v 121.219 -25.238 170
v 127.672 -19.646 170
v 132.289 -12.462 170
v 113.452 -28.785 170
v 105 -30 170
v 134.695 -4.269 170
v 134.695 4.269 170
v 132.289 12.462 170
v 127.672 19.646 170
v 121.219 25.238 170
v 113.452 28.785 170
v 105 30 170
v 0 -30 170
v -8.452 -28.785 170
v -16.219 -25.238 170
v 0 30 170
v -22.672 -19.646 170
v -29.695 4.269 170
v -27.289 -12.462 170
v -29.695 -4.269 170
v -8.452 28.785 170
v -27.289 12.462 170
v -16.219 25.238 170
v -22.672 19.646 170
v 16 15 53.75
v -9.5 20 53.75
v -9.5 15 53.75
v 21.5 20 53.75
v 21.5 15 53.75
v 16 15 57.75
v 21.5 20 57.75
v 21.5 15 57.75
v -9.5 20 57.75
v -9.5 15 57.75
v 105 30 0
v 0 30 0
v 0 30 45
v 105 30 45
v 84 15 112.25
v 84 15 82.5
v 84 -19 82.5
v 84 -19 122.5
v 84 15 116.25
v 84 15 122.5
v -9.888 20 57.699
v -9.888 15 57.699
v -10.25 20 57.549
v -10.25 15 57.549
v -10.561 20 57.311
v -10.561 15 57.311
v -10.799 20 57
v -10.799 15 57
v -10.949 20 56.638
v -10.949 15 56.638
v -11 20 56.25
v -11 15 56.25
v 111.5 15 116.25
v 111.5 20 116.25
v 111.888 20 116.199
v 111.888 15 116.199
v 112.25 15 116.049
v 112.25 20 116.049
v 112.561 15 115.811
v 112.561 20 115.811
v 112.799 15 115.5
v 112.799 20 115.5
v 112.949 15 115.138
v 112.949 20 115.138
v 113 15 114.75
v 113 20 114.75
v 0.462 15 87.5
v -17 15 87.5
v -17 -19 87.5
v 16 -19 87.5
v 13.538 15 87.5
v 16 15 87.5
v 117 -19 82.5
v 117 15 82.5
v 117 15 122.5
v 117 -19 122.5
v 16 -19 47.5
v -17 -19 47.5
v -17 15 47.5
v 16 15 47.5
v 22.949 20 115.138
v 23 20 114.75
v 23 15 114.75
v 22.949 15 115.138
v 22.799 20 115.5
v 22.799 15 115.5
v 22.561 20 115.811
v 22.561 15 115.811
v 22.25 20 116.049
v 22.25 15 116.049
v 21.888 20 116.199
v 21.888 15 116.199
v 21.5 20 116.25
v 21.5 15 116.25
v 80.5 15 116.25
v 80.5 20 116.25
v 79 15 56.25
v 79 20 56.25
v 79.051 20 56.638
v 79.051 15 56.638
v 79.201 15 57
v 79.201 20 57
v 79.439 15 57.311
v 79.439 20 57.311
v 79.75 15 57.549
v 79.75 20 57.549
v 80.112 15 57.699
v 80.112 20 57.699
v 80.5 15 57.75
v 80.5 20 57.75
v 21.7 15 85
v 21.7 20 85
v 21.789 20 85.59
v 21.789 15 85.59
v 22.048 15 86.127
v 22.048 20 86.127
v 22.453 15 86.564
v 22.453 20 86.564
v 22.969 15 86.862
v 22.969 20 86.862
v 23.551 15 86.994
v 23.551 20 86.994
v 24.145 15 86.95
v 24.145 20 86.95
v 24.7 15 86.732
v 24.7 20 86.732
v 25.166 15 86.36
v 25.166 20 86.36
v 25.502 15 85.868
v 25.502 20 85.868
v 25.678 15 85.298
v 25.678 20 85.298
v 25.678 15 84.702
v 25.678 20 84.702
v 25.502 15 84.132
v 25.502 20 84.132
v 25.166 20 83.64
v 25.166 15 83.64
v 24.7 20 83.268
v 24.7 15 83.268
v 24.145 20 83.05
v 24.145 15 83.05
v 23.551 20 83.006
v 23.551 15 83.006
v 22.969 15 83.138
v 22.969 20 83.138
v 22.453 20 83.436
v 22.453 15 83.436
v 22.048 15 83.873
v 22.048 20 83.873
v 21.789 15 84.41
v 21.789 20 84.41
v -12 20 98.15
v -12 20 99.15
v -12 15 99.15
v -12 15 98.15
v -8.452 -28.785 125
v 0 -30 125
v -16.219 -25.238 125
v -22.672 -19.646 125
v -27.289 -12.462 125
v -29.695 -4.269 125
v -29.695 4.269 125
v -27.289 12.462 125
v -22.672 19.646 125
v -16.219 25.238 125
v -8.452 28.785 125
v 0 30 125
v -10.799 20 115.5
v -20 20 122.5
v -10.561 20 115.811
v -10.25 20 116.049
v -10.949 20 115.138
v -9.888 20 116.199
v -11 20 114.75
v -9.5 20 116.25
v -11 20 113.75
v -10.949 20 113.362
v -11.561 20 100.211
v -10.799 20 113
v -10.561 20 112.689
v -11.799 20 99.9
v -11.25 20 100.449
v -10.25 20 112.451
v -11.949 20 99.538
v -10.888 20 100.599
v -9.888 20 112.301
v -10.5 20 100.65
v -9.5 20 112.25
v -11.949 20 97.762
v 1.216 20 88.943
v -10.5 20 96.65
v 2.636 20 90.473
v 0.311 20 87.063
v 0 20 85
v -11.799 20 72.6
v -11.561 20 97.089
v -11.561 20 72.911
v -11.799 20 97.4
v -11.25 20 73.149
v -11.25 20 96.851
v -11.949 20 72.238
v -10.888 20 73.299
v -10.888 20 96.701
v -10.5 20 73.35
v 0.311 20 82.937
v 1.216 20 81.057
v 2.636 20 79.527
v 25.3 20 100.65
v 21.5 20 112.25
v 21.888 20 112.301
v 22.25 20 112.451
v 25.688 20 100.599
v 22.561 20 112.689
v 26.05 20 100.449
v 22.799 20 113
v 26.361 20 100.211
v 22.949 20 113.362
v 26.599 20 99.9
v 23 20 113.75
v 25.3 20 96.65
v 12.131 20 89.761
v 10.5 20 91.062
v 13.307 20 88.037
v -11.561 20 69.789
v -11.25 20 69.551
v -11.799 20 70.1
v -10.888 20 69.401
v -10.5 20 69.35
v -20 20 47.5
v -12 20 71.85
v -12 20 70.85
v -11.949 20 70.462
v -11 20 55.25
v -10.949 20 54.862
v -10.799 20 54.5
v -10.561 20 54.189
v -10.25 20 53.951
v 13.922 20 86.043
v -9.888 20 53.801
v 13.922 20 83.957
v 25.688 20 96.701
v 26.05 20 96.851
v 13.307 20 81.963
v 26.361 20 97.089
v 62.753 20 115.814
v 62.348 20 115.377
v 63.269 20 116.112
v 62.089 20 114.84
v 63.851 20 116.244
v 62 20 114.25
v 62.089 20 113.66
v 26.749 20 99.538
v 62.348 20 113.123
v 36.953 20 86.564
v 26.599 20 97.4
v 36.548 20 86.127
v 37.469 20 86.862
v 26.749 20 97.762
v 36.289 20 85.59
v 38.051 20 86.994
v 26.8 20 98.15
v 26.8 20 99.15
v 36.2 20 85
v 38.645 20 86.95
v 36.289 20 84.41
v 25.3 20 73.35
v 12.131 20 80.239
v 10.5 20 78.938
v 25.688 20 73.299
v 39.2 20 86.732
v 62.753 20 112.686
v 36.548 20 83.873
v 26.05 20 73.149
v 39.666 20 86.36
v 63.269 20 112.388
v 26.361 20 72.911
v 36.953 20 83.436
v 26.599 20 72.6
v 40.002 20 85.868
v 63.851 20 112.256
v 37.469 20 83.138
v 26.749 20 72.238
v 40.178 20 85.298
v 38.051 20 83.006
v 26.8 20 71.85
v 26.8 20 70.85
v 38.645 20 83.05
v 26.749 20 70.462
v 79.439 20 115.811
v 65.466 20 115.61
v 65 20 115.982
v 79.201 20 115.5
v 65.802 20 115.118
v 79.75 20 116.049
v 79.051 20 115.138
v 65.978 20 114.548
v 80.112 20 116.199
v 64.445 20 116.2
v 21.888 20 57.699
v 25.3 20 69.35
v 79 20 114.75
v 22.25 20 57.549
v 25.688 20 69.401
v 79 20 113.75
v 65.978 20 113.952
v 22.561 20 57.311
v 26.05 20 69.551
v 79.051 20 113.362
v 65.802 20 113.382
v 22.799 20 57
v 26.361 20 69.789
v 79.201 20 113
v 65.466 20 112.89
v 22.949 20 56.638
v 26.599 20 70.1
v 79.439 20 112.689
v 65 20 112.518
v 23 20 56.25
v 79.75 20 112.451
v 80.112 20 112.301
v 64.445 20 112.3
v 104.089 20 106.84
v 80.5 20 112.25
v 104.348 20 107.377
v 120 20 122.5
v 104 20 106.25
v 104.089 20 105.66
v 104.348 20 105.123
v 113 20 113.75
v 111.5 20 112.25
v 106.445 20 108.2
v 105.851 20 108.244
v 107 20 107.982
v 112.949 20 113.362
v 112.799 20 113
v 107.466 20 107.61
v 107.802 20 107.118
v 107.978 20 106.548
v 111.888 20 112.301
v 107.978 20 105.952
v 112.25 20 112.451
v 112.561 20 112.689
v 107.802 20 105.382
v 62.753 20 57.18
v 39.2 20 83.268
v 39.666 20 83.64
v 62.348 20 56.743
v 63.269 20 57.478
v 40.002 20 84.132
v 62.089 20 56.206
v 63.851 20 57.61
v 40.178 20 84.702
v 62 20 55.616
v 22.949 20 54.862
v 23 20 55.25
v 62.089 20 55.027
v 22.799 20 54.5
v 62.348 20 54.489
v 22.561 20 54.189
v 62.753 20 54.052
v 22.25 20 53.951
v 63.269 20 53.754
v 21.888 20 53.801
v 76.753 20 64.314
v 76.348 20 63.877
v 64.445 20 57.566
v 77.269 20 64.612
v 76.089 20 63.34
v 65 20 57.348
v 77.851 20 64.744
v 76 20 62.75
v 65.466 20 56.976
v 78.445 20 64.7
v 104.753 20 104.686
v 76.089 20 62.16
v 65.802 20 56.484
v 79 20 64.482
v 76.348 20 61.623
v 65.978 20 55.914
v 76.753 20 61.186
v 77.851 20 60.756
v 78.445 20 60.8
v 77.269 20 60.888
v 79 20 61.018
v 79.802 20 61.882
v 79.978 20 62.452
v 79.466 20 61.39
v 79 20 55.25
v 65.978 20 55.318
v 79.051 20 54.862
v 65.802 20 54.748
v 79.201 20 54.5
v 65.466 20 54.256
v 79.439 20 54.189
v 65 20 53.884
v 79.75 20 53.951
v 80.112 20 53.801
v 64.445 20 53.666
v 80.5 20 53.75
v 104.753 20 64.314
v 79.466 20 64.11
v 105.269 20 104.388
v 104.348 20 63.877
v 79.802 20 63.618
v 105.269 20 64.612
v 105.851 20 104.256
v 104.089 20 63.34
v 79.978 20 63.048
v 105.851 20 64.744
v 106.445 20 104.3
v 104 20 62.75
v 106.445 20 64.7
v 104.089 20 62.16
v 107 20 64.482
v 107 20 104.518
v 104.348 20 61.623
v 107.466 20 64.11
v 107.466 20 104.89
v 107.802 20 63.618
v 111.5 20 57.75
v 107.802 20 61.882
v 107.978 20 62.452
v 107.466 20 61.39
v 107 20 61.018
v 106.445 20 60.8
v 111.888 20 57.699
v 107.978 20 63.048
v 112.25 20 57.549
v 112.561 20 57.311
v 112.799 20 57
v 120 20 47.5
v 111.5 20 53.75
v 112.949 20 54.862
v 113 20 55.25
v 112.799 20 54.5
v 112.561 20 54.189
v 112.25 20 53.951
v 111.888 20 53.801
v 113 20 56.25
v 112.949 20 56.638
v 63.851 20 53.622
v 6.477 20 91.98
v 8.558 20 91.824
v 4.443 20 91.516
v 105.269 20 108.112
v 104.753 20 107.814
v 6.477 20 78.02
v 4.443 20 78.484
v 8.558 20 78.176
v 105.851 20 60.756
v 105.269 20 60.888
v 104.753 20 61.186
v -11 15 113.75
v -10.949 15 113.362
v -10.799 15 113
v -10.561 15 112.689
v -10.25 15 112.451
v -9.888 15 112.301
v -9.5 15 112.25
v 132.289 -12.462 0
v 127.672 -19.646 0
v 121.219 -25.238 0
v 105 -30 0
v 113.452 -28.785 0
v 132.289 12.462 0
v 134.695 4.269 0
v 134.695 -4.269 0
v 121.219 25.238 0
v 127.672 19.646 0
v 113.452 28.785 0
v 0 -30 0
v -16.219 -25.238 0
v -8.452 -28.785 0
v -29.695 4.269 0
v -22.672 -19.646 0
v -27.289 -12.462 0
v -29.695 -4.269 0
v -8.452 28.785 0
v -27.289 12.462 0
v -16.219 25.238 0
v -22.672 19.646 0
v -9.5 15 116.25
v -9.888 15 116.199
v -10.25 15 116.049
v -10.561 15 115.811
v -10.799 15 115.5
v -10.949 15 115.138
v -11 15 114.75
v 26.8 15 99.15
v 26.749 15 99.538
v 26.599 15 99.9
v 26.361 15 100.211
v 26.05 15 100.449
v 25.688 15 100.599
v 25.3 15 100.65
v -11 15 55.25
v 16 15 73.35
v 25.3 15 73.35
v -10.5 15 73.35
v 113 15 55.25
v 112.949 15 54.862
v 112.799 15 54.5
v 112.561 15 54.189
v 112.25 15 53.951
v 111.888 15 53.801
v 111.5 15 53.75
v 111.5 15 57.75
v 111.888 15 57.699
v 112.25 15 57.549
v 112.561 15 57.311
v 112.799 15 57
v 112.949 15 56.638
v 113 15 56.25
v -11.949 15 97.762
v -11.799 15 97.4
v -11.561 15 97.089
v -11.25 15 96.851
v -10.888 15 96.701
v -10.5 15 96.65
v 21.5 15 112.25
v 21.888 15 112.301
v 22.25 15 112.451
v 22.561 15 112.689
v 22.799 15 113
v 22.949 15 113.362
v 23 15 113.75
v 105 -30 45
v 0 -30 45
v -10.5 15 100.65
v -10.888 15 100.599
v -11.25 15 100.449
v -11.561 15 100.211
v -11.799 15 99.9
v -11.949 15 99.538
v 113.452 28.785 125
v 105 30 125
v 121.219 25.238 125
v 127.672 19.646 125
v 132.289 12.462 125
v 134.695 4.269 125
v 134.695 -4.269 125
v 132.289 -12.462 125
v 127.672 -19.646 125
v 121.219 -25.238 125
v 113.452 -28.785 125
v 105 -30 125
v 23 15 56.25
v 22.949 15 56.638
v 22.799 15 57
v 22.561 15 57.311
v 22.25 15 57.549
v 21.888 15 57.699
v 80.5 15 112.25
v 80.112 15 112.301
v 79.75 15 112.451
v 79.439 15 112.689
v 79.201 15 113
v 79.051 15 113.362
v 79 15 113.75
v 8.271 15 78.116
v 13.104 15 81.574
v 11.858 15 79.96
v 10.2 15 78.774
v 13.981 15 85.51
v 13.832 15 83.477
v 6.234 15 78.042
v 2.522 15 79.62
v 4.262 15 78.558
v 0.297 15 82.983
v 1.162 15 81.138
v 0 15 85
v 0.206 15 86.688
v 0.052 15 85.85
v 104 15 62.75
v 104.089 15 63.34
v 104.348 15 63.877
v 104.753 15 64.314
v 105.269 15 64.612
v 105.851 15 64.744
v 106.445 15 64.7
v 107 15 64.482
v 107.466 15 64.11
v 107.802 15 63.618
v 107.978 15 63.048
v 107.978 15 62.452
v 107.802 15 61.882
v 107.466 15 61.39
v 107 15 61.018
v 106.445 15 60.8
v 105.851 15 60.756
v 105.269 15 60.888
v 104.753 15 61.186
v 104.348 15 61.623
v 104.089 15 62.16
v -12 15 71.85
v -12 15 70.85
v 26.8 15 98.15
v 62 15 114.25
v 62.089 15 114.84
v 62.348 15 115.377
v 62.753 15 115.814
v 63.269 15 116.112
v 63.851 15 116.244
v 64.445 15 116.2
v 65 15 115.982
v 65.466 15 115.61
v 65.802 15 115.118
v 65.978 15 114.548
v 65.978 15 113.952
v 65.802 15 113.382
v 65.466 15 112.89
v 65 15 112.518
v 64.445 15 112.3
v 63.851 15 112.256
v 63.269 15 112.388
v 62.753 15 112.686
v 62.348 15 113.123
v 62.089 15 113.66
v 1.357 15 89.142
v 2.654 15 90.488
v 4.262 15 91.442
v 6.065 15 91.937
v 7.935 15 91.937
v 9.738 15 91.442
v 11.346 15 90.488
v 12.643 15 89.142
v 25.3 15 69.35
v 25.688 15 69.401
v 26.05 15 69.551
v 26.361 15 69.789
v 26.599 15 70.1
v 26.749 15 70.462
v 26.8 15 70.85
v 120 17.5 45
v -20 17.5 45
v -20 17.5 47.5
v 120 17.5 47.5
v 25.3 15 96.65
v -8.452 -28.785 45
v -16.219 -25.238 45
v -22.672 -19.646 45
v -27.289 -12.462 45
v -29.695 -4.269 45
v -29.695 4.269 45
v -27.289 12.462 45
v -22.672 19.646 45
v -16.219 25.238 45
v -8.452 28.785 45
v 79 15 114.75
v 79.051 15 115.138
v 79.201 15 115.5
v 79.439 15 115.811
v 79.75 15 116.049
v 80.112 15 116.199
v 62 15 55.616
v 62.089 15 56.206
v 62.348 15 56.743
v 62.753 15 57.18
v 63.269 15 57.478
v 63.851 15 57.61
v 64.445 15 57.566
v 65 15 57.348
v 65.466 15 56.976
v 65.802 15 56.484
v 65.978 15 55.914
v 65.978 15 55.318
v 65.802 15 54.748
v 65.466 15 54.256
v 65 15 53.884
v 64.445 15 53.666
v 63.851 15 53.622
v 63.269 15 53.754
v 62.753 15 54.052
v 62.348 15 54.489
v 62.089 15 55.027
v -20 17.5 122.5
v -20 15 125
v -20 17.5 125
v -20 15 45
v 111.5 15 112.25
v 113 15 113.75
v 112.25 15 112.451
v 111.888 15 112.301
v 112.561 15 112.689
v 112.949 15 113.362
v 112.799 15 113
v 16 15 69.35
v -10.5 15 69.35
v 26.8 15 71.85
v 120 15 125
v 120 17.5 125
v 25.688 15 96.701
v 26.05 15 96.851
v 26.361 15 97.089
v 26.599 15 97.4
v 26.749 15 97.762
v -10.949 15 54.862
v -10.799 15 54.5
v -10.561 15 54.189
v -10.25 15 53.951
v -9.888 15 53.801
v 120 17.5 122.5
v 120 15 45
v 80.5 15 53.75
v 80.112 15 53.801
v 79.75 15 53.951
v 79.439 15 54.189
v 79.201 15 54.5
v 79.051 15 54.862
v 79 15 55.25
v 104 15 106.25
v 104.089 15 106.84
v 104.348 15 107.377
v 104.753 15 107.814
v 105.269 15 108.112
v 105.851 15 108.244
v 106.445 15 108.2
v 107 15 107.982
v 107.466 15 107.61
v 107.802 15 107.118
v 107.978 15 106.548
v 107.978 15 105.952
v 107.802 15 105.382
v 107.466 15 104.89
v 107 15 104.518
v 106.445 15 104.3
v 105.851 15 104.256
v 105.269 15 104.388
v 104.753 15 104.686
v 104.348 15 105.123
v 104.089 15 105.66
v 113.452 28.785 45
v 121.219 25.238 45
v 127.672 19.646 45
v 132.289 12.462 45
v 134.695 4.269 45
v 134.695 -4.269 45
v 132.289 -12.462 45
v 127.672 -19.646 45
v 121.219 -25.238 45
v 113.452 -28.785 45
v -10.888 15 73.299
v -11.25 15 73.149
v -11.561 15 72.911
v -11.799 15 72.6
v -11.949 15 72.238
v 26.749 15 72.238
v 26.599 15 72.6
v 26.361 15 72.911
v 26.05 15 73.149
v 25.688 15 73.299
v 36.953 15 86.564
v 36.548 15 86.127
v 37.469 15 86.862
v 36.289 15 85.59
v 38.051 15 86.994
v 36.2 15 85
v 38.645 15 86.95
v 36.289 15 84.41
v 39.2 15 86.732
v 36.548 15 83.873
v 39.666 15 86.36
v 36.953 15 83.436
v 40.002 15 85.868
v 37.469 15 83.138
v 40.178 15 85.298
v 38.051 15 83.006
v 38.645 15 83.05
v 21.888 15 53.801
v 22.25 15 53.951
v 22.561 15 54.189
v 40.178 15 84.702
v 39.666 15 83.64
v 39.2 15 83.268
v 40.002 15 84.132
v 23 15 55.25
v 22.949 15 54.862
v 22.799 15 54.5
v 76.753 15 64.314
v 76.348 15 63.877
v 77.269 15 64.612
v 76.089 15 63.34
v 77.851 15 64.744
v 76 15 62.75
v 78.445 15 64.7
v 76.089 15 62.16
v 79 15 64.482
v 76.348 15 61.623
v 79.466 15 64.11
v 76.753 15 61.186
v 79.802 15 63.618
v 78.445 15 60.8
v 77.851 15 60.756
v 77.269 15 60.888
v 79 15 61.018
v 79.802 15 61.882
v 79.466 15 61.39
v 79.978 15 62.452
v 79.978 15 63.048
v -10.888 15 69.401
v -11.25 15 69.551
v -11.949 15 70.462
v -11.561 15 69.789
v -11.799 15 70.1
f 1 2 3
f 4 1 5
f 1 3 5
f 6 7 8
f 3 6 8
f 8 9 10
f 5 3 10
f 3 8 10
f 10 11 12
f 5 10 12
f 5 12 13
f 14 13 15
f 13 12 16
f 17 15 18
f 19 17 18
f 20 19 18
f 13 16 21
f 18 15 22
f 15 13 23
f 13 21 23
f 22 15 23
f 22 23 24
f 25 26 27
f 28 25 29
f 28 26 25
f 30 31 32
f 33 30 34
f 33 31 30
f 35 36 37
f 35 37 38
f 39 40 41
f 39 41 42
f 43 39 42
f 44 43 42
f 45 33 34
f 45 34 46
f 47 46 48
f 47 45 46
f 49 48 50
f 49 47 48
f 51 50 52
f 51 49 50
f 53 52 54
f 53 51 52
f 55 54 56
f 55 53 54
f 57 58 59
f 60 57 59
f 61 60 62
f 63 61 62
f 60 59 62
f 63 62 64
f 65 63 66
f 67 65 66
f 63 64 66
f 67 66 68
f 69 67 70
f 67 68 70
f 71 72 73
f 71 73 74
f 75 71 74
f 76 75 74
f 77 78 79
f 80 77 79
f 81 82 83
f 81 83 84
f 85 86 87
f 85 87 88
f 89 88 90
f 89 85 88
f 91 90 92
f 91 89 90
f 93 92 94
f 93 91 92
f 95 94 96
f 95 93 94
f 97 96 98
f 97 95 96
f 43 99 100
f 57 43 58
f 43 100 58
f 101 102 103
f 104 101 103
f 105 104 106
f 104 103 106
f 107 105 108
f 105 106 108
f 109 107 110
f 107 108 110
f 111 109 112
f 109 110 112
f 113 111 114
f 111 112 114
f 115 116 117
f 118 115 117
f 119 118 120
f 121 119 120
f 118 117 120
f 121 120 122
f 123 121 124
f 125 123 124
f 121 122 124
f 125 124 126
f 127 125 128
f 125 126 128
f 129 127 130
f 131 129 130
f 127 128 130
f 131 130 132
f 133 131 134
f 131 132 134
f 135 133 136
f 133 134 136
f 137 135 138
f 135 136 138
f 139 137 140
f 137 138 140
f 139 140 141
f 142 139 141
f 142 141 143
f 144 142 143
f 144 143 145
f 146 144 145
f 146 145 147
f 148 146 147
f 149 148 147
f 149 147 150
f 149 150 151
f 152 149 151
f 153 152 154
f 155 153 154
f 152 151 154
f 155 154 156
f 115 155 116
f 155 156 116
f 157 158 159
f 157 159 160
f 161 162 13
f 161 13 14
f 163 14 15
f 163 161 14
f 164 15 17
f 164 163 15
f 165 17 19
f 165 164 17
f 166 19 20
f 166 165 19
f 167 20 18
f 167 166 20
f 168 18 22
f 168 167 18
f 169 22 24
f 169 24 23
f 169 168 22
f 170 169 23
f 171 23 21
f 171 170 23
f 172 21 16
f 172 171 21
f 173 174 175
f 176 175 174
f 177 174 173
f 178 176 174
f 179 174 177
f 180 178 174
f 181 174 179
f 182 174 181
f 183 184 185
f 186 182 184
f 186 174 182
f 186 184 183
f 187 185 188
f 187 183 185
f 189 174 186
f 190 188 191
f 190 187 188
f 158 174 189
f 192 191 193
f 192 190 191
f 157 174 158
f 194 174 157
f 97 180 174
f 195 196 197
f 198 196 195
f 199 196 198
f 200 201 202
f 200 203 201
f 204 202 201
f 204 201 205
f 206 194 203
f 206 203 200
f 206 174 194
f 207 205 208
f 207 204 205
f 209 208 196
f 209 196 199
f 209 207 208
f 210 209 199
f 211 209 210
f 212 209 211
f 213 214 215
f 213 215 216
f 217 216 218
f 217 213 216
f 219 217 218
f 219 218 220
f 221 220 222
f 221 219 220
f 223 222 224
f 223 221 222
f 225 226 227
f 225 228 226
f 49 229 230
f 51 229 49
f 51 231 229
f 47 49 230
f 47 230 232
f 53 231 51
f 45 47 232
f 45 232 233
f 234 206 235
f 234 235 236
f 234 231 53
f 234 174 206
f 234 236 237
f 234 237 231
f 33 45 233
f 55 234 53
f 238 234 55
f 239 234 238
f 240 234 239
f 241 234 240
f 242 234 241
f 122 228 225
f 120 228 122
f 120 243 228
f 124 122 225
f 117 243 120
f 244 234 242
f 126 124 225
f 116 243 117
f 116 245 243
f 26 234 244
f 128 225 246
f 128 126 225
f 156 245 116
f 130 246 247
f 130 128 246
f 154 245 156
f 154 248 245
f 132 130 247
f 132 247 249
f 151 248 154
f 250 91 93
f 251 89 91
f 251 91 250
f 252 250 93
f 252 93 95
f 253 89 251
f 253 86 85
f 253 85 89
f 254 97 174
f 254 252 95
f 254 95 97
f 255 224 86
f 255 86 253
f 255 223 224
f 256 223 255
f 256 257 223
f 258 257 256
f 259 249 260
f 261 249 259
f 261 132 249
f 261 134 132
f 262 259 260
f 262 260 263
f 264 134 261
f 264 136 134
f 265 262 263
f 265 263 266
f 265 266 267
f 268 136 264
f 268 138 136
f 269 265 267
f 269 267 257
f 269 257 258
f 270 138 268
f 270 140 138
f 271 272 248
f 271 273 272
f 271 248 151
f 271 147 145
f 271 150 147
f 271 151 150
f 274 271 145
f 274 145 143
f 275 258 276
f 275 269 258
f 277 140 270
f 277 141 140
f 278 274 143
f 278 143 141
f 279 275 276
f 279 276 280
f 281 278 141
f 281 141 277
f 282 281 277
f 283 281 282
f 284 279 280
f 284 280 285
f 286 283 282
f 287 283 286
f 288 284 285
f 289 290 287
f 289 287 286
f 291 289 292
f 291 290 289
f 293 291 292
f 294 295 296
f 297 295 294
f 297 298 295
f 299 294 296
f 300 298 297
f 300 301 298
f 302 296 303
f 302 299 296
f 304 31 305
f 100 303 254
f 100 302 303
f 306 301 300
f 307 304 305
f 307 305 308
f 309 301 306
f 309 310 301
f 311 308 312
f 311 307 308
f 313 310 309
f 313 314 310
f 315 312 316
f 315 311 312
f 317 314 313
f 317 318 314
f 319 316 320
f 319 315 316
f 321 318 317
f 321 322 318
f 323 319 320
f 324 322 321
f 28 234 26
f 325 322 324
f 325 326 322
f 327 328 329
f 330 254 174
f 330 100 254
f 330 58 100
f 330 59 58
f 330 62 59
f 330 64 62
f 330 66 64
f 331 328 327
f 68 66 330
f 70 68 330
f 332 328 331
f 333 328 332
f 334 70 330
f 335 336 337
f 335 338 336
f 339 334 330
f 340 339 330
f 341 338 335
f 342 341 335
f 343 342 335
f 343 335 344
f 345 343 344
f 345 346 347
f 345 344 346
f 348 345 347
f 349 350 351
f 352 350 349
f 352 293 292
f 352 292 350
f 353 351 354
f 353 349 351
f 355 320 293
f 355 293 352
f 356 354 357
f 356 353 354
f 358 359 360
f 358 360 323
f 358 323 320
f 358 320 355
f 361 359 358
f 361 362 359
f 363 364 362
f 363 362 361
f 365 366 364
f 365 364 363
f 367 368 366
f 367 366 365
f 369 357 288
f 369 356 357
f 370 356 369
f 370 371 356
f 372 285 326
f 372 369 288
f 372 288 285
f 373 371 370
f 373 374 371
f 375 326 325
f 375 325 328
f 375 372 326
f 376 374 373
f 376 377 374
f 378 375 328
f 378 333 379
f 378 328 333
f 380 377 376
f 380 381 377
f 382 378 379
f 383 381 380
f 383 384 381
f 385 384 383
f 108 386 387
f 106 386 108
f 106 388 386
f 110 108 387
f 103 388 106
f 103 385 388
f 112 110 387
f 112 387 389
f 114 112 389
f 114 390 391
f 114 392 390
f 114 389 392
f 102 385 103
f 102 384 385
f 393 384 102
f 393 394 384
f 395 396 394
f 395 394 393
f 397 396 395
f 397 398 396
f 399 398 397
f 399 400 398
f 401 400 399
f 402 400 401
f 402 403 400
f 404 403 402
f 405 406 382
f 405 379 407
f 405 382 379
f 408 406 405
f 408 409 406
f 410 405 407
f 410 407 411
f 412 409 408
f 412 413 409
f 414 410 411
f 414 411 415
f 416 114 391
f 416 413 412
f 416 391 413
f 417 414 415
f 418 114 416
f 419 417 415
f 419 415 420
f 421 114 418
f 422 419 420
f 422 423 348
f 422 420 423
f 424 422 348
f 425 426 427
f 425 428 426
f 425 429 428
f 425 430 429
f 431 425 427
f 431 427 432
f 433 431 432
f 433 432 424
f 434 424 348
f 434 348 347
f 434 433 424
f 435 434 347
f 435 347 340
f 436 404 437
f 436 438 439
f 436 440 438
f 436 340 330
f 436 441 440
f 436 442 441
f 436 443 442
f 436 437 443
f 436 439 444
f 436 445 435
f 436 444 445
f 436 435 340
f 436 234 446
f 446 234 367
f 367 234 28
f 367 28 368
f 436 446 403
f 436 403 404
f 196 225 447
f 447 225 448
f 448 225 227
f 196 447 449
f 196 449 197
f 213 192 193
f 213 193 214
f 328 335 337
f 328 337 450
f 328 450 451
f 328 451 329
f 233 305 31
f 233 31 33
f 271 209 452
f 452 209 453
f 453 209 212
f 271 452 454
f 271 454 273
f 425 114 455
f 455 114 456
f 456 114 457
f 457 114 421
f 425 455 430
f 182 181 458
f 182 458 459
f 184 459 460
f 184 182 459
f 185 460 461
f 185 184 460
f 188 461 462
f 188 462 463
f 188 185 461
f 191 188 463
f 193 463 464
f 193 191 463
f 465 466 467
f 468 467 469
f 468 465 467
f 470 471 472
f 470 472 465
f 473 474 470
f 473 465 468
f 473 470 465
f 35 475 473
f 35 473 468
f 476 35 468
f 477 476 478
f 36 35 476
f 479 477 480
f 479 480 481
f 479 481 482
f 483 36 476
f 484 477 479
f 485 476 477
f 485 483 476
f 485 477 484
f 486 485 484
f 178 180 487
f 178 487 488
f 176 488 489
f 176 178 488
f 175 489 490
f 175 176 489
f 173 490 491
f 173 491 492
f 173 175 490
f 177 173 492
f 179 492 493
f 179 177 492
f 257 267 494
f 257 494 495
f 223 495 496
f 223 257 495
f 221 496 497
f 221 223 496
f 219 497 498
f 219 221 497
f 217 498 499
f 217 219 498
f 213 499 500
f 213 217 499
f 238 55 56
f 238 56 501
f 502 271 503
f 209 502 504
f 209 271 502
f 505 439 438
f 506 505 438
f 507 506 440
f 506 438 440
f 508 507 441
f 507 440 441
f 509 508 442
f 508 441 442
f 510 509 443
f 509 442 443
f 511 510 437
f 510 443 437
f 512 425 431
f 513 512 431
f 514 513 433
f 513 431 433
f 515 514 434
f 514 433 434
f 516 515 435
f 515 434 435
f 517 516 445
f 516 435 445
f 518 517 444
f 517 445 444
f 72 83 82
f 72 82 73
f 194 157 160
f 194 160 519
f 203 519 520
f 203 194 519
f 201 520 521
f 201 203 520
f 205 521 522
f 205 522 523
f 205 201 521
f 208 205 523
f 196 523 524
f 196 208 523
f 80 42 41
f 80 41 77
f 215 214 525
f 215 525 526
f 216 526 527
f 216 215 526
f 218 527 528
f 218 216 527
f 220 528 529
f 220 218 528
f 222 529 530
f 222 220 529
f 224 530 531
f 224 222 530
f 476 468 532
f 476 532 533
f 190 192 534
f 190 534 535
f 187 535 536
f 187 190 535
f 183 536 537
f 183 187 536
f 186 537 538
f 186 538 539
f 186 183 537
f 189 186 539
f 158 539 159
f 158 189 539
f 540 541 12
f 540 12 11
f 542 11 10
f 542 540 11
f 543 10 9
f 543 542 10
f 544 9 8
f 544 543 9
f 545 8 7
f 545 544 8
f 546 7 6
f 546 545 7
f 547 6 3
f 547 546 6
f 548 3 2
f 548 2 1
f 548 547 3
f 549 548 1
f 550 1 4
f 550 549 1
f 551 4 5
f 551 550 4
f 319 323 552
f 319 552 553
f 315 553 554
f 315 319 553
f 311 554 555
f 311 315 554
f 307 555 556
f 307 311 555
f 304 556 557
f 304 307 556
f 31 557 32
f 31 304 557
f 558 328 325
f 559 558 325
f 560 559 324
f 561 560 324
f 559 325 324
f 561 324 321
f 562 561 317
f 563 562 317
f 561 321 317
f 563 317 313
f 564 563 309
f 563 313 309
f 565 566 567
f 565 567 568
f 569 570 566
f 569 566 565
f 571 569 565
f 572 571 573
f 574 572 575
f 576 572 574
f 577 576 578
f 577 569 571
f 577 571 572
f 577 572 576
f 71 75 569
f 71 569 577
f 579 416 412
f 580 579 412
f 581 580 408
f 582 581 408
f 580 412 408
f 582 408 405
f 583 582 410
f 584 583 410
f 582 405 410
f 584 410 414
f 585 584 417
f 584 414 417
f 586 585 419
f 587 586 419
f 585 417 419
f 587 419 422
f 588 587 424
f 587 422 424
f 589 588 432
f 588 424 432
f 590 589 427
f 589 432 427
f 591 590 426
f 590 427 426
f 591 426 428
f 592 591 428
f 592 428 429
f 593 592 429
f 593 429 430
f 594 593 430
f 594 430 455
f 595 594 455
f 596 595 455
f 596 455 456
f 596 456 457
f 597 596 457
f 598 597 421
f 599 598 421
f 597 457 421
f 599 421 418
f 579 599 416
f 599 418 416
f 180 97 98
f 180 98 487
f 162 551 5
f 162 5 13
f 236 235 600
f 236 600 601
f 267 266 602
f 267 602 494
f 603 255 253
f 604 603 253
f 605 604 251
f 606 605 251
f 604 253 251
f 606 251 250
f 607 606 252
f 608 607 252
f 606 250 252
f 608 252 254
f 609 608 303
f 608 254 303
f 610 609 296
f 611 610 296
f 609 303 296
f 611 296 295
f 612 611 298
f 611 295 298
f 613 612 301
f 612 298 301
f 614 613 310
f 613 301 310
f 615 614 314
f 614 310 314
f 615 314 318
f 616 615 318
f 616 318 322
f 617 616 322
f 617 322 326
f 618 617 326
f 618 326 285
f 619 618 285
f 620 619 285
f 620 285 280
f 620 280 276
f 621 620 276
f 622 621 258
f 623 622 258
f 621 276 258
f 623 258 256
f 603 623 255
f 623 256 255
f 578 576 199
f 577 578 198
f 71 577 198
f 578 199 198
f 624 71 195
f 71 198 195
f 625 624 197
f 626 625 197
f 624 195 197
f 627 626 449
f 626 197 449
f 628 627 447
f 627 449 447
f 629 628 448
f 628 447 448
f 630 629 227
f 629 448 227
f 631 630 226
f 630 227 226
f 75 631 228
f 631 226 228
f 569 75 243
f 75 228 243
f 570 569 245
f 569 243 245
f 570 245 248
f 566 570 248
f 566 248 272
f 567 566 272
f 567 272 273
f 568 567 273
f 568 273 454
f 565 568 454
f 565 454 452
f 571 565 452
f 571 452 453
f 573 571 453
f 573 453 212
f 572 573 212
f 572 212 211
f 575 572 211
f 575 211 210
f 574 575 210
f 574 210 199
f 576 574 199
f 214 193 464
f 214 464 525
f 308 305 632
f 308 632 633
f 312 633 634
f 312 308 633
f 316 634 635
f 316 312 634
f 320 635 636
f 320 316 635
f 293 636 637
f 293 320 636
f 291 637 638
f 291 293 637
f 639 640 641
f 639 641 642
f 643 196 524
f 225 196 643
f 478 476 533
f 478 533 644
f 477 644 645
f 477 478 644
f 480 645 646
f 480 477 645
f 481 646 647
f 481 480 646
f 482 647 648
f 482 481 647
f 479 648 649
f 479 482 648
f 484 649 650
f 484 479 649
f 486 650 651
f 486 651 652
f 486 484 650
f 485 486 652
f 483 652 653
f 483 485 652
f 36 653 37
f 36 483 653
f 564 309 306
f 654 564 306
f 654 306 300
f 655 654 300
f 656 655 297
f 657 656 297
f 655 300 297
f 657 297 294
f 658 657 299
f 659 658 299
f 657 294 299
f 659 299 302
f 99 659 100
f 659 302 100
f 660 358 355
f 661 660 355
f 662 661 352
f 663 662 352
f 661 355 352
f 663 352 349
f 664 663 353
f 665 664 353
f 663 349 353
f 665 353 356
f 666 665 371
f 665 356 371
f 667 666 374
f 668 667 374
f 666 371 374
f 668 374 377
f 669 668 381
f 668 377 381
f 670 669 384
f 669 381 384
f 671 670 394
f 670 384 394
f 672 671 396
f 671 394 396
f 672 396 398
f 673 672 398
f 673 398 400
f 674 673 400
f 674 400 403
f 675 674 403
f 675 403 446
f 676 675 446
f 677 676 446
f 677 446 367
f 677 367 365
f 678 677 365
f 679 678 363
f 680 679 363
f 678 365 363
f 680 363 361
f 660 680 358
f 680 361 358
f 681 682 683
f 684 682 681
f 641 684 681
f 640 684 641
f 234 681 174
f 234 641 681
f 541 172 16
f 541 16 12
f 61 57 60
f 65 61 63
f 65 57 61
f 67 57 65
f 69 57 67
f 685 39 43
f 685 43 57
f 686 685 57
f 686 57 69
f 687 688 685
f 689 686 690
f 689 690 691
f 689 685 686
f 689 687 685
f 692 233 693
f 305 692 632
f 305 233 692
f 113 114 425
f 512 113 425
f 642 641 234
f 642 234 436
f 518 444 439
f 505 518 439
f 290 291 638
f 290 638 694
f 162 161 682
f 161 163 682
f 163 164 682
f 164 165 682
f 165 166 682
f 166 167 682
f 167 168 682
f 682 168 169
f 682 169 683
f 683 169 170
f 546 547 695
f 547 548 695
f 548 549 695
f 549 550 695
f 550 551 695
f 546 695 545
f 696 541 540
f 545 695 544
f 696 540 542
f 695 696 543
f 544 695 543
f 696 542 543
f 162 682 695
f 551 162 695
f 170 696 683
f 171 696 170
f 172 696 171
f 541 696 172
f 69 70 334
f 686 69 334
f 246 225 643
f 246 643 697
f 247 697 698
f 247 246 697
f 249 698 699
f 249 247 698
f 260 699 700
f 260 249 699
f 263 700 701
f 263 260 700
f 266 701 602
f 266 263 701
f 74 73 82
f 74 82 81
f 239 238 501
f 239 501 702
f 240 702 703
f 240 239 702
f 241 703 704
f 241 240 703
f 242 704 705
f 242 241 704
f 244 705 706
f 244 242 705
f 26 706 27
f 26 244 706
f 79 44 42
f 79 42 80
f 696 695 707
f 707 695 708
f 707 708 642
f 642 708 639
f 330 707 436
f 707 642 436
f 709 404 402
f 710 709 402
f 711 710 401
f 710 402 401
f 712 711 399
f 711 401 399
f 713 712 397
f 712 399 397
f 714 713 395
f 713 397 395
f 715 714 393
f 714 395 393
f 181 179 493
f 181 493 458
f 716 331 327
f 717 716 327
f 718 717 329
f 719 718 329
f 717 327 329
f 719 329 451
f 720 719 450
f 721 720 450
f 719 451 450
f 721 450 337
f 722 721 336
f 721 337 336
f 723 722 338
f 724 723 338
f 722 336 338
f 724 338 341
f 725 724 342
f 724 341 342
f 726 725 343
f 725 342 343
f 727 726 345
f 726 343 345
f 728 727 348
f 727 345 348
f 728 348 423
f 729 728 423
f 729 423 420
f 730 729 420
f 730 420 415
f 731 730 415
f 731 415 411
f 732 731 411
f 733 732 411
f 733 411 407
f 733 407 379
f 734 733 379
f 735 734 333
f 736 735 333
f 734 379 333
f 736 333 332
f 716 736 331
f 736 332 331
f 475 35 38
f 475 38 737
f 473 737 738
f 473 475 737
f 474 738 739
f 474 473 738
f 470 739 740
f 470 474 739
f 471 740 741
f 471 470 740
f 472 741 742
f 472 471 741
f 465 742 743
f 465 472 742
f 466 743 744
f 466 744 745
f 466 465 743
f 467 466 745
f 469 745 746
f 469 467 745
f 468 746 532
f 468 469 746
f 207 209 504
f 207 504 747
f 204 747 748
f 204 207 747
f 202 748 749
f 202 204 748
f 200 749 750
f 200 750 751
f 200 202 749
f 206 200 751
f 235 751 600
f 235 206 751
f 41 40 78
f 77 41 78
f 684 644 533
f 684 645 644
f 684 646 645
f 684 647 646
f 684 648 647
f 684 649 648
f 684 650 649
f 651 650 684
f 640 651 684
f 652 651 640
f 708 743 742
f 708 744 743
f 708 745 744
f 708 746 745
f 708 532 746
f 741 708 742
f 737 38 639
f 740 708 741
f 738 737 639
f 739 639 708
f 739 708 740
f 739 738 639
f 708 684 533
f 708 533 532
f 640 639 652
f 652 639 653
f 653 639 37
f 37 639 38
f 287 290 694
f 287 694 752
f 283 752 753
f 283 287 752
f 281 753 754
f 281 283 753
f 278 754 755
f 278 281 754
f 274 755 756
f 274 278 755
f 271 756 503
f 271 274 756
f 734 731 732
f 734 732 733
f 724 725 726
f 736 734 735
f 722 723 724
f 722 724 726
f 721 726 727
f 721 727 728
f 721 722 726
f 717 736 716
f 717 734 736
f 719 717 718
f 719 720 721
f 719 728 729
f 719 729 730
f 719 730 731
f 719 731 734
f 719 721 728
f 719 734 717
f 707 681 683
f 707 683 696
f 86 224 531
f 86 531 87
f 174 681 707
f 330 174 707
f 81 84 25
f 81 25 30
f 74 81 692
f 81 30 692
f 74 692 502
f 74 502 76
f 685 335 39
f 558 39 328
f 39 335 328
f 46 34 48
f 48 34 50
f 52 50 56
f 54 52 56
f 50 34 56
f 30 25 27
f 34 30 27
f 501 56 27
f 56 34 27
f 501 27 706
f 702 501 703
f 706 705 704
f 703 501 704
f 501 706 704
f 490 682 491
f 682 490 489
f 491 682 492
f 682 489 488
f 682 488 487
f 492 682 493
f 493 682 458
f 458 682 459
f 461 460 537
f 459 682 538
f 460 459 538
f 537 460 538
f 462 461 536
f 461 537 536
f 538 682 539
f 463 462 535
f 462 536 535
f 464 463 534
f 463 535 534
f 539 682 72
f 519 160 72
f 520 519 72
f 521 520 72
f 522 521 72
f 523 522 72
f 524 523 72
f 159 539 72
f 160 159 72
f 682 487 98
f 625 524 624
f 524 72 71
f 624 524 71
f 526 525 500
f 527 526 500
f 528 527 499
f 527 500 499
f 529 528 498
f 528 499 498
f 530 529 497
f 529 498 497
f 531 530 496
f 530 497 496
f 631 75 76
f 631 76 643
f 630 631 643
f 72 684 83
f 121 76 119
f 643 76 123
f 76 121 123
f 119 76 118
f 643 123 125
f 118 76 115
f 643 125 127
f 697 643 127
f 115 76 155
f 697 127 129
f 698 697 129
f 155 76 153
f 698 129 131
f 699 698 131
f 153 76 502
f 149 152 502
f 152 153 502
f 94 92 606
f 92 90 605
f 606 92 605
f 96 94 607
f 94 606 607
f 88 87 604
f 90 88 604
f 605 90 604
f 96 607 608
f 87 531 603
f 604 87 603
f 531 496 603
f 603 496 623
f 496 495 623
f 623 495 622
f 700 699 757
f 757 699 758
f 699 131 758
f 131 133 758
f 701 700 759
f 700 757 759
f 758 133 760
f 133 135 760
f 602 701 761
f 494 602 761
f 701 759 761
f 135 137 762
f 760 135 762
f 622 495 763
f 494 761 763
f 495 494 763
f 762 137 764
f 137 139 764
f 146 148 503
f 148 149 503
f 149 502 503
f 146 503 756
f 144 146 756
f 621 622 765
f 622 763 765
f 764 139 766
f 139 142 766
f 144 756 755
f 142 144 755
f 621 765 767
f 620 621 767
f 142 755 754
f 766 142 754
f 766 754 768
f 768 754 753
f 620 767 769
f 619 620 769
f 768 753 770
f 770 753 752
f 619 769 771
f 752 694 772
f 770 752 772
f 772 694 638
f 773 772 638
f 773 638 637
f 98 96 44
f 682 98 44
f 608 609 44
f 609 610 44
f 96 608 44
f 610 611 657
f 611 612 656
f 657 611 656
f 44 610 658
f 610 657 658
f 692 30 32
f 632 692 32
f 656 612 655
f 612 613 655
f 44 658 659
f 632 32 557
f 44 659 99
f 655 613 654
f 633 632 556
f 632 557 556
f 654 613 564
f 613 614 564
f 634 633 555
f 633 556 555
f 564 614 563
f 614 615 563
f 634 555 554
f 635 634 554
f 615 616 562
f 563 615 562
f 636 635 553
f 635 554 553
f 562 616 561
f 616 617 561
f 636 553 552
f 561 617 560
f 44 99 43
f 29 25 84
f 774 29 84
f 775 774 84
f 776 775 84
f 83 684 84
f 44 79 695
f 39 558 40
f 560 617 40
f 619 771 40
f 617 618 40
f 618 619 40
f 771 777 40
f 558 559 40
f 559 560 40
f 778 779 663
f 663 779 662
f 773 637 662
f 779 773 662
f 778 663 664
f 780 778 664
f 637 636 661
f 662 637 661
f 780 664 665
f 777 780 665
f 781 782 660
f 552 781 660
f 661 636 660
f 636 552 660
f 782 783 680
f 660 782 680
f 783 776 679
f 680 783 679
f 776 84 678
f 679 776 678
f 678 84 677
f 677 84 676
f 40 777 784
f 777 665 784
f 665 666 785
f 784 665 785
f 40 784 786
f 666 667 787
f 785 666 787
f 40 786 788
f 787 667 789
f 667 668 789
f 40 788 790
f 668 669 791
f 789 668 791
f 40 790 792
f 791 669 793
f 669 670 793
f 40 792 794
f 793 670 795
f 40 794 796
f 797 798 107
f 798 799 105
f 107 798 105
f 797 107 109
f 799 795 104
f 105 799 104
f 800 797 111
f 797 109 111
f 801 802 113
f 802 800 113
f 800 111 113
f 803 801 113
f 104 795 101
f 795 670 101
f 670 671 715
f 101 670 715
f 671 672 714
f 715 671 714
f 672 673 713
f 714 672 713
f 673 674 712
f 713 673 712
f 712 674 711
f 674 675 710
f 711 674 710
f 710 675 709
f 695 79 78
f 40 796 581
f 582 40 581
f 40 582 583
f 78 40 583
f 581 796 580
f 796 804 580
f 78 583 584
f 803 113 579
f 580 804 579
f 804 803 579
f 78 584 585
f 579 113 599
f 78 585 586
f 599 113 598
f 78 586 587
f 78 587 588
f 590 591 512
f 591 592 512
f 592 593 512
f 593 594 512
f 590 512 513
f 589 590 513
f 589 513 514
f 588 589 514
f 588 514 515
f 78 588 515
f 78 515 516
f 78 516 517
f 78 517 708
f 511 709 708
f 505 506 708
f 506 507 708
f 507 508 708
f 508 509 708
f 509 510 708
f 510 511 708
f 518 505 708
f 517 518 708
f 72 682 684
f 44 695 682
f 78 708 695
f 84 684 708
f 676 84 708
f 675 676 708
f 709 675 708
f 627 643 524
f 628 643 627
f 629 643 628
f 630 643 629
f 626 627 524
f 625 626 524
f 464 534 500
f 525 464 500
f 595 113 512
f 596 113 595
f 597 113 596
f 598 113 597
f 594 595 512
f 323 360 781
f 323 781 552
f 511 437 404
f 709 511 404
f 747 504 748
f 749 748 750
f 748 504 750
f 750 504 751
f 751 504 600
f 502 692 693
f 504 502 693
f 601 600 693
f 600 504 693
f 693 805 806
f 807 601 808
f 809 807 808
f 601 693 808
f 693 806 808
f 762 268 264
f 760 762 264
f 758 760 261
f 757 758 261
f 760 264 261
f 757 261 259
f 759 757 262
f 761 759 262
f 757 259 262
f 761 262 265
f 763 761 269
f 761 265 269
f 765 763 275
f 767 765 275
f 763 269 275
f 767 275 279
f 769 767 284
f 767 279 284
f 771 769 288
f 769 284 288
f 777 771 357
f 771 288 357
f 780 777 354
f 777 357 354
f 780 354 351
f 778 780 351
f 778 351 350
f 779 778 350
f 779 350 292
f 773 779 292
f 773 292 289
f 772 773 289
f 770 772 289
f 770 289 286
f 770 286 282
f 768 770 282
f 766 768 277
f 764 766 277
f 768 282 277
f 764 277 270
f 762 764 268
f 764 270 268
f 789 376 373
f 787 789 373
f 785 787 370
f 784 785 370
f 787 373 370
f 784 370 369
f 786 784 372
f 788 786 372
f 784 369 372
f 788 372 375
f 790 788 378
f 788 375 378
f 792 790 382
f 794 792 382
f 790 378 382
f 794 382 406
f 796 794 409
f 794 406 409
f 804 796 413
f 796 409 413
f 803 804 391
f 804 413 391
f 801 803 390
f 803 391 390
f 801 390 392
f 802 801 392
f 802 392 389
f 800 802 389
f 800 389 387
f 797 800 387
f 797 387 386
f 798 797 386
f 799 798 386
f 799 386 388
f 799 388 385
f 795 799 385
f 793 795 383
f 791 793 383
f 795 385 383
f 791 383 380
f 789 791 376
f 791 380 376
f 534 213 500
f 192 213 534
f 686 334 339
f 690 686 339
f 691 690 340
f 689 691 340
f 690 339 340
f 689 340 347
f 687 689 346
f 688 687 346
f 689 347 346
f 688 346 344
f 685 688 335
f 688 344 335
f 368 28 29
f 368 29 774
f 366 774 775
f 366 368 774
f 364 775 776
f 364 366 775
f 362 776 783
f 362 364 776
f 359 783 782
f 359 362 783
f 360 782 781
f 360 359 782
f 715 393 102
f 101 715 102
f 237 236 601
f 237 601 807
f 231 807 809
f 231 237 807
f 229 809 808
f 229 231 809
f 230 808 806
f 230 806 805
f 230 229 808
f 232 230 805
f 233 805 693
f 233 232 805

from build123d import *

# Parameters (mm, degrees)
BOSS_EXTRU_1_DEPTH      = 170
ESQUISSE2_W             = 206.92447976
ESQUISSE2_H             = 80
ENL_V_MAT_EXTRU_1_DEPTH = 170
ESQUISSE3_W             = 140
ESQUISSE3_H             = 2.5
BOSS_EXTRU_2_DEPTH      = 80
ESQUISSE4_W             = 140
ESQUISSE4_H             = 75
BOSS_EXTRU_4_DEPTH      = 2.5
ESQUISSE5_W             = 33
ESQUISSE5_H             = 40
BOSS_EXTRU_5_DEPTH      = 34
ESQUISSE6_R             = 7
ESQUISSE6_R_2           = 2
ENL_V_MAT_EXTRU_2_DEPTH = 5


with BuildPart() as part:
    # Esquisse1 → Boss.-Extru.1 (new body)
    with BuildSketch(Plane.XY):
        with BuildLine():
            Line((0, 30), (105, 30))
            ThreePointArc((105, 30), (135, 0), (105, -30))
            Line((105, -30), (0, -30))
            ThreePointArc((0, -30), (-30, 0), (0, 30))
        make_face()
    extrude(amount=BOSS_EXTRU_1_DEPTH)

    # Esquisse2 → Enlèv. mat.-Extru.1 (cut)
    with BuildSketch(Plane(origin=(0, 30, 0), x_dir=(1, 0, 0), z_dir=(0, 1, 0))):
        with Locations((42.57058543, -85)):
            Rectangle(ESQUISSE2_W, ESQUISSE2_H)
    extrude(amount=-ENL_V_MAT_EXTRU_1_DEPTH, mode=Mode.SUBTRACT)


with BuildPart() as enl_v_mat_extru_1_piece_1:
    # of the separate pieces the step leaves, piece 1, a body of its own (enl_v_mat_extru_1_pieces)
    add(part.part.solids().sort_by_distance((105, -30, 0))[0])



with BuildPart() as enl_v_mat_extru_1_piece_2:
    # of the separate pieces the step leaves, piece 2, a body of its own (enl_v_mat_extru_1_pieces)
    add(part.part.solids().sort_by_distance((0, -30, 125))[0])


with BuildPart() as enl_v_mat_extru_1_piece_1_1:
    add(enl_v_mat_extru_1_piece_1.part)

    add(enl_v_mat_extru_1_piece_2.part)  # Boss.-Extru.2 merges Enlèv. mat.-Extru.1 piece 2
    # Esquisse3 → Boss.-Extru.2 (add)
    with BuildSketch(Plane.XY.offset(45)):
        with Locations((50, 16.25)):
            Rectangle(ESQUISSE3_W, ESQUISSE3_H)
    extrude(amount=BOSS_EXTRU_2_DEPTH)

    # Esquisse4 → Boss.-Extru.4 (add)
    with BuildSketch(Plane(origin=(0, 17.5, 0), x_dir=(1, 0, 0), z_dir=(0, 1, 0))):
        with Locations((50, -85)):
            Rectangle(ESQUISSE4_W, ESQUISSE4_H)
    extrude(amount=BOSS_EXTRU_4_DEPTH)

    # Esquisse5 → Boss.-Extru.5 (add)
    with BuildSketch(Plane.XZ.offset(-15)):
        with Locations((-0.5, 67.5)):
            Rectangle(ESQUISSE5_W, ESQUISSE5_H)
        with Locations((100.5, 102.5)):
            Rectangle(ESQUISSE5_W, ESQUISSE5_H)
    extrude(amount=BOSS_EXTRU_5_DEPTH)

    # Esquisse6 → Enlèv. mat.-Extru.2 (cut)
    with BuildSketch(Plane(origin=(0, 20, 0), x_dir=(1, 0, 0), z_dir=(0, 1, 0))):
        with Locations(Location((7, -85, 0), (0, 0, 180))):
            Circle(ESQUISSE6_R)
        with Locations(Location((23.7, -85, 0), (0, 0, 180))):
            Circle(ESQUISSE6_R_2)
        with Locations(Location((38.2, -85, 0), (0, 0, 180))):
            Circle(ESQUISSE6_R_2)
        with Locations(Location((64, -114.25, 0), (0, 0, 180))):
            Circle(ESQUISSE6_R_2)
        with Locations(Location((64, -55.616071429, 0), (0, 0, 180))):
            Circle(ESQUISSE6_R_2)
        with Locations(Location((78, -62.75, 0), (0, 0, 180))):
            Circle(ESQUISSE6_R_2)
        with Locations(Location((106, -62.75, 0), (0, 0, 180))):
            Circle(ESQUISSE6_R_2)
        with Locations(Location((106, -106.25, 0), (0, 0, 180))):
            Circle(ESQUISSE6_R_2)
        with BuildLine():
            Line((-9.5, -53.75), (21.5, -53.75))
            ThreePointArc((21.5, -53.75), (22.560660172, -54.189339828), (23, -55.25))
            Line((23, -55.25), (23, -56.25))
            ThreePointArc((23, -56.25), (22.560660172, -57.310660172), (21.5, -57.75))
            Line((21.5, -57.75), (-9.5, -57.75))
            ThreePointArc((-9.5, -57.75), (-10.560660172, -57.310660172), (-11, -56.25))
            Line((-11, -56.25), (-11, -55.25))
            ThreePointArc((-11, -55.25), (-10.560660172, -54.189339828), (-9.5, -53.75))
        make_face()
        with BuildLine():
            Line((-10.5, -69.35), (25.3, -69.35))
            ThreePointArc((25.3, -69.35), (26.360660172, -69.789339828), (26.8, -70.85))
            Line((26.8, -70.85), (26.8, -71.85))
            ThreePointArc((26.8, -71.85), (26.360660172, -72.910660172), (25.3, -73.35))
            Line((25.3, -73.35), (-10.5, -73.35))
            ThreePointArc((-10.5, -73.35), (-11.560660172, -72.910660172), (-12, -71.85))
            Line((-12, -71.85), (-12, -70.85))
            ThreePointArc((-12, -70.85), (-11.560660172, -69.789339828), (-10.5, -69.35))
        make_face()
        with BuildLine():
            Line((-10.5, -96.65), (25.3, -96.65))
            ThreePointArc((25.3, -96.65), (26.360660172, -97.089339828), (26.8, -98.15))
            Line((26.8, -98.15), (26.8, -99.15))
            ThreePointArc((26.8, -99.15), (26.360660172, -100.210660172), (25.3, -100.65))
            Line((25.3, -100.65), (-10.5, -100.65))
            ThreePointArc((-10.5, -100.65), (-11.560660172, -100.210660172), (-12, -99.15))
            Line((-12, -99.15), (-12, -98.15))
            ThreePointArc((-12, -98.15), (-11.560660172, -97.089339828), (-10.5, -96.65))
        make_face()
        with BuildLine():
            Line((-9.5, -112.25), (21.5, -112.25))
            ThreePointArc((21.5, -112.25), (22.560660172, -112.689339828), (23, -113.75))
            Line((23, -113.75), (23, -114.75))
            ThreePointArc((23, -114.75), (22.560660172, -115.810660172), (21.5, -116.25))
            Line((21.5, -116.25), (-9.5, -116.25))
            ThreePointArc((-9.5, -116.25), (-10.560660172, -115.810660172), (-11, -114.75))
            Line((-11, -114.75), (-11, -113.75))
            ThreePointArc((-11, -113.75), (-10.560660172, -112.689339828), (-9.5, -112.25))
        make_face()
        with BuildLine():
            Line((111.5, -53.75), (80.5, -53.75))
            ThreePointArc((80.5, -53.75), (79.439339828, -54.189339828), (79, -55.25))
            Line((79, -55.25), (79, -56.25))
            ThreePointArc((79, -56.25), (79.439339828, -57.310660172), (80.5, -57.75))
            Line((80.5, -57.75), (111.5, -57.75))
            ThreePointArc((111.5, -57.75), (112.560660172, -57.310660172), (113, -56.25))
            Line((113, -56.25), (113, -55.25))
            ThreePointArc((113, -55.25), (112.560660172, -54.189339828), (111.5, -53.75))
        make_face()
        with BuildLine():
            Line((80.5, -116.25), (111.5, -116.25))
            ThreePointArc((111.5, -116.25), (112.560660172, -115.810660172), (113, -114.75))
            Line((113, -114.75), (113, -113.75))
            ThreePointArc((113, -113.75), (112.560660172, -112.689339828), (111.5, -112.25))
            Line((111.5, -112.25), (80.5, -112.25))
            ThreePointArc((80.5, -112.25), (79.439339828, -112.689339828), (79, -113.75))
            Line((79, -113.75), (79, -114.75))
            ThreePointArc((79, -114.75), (79.439339828, -115.810660172), (80.5, -116.25))
        make_face()
    extrude(amount=-ENL_V_MAT_EXTRU_2_DEPTH, mode=Mode.SUBTRACT)


solid = enl_v_mat_extru_1_piece_1_1.part
